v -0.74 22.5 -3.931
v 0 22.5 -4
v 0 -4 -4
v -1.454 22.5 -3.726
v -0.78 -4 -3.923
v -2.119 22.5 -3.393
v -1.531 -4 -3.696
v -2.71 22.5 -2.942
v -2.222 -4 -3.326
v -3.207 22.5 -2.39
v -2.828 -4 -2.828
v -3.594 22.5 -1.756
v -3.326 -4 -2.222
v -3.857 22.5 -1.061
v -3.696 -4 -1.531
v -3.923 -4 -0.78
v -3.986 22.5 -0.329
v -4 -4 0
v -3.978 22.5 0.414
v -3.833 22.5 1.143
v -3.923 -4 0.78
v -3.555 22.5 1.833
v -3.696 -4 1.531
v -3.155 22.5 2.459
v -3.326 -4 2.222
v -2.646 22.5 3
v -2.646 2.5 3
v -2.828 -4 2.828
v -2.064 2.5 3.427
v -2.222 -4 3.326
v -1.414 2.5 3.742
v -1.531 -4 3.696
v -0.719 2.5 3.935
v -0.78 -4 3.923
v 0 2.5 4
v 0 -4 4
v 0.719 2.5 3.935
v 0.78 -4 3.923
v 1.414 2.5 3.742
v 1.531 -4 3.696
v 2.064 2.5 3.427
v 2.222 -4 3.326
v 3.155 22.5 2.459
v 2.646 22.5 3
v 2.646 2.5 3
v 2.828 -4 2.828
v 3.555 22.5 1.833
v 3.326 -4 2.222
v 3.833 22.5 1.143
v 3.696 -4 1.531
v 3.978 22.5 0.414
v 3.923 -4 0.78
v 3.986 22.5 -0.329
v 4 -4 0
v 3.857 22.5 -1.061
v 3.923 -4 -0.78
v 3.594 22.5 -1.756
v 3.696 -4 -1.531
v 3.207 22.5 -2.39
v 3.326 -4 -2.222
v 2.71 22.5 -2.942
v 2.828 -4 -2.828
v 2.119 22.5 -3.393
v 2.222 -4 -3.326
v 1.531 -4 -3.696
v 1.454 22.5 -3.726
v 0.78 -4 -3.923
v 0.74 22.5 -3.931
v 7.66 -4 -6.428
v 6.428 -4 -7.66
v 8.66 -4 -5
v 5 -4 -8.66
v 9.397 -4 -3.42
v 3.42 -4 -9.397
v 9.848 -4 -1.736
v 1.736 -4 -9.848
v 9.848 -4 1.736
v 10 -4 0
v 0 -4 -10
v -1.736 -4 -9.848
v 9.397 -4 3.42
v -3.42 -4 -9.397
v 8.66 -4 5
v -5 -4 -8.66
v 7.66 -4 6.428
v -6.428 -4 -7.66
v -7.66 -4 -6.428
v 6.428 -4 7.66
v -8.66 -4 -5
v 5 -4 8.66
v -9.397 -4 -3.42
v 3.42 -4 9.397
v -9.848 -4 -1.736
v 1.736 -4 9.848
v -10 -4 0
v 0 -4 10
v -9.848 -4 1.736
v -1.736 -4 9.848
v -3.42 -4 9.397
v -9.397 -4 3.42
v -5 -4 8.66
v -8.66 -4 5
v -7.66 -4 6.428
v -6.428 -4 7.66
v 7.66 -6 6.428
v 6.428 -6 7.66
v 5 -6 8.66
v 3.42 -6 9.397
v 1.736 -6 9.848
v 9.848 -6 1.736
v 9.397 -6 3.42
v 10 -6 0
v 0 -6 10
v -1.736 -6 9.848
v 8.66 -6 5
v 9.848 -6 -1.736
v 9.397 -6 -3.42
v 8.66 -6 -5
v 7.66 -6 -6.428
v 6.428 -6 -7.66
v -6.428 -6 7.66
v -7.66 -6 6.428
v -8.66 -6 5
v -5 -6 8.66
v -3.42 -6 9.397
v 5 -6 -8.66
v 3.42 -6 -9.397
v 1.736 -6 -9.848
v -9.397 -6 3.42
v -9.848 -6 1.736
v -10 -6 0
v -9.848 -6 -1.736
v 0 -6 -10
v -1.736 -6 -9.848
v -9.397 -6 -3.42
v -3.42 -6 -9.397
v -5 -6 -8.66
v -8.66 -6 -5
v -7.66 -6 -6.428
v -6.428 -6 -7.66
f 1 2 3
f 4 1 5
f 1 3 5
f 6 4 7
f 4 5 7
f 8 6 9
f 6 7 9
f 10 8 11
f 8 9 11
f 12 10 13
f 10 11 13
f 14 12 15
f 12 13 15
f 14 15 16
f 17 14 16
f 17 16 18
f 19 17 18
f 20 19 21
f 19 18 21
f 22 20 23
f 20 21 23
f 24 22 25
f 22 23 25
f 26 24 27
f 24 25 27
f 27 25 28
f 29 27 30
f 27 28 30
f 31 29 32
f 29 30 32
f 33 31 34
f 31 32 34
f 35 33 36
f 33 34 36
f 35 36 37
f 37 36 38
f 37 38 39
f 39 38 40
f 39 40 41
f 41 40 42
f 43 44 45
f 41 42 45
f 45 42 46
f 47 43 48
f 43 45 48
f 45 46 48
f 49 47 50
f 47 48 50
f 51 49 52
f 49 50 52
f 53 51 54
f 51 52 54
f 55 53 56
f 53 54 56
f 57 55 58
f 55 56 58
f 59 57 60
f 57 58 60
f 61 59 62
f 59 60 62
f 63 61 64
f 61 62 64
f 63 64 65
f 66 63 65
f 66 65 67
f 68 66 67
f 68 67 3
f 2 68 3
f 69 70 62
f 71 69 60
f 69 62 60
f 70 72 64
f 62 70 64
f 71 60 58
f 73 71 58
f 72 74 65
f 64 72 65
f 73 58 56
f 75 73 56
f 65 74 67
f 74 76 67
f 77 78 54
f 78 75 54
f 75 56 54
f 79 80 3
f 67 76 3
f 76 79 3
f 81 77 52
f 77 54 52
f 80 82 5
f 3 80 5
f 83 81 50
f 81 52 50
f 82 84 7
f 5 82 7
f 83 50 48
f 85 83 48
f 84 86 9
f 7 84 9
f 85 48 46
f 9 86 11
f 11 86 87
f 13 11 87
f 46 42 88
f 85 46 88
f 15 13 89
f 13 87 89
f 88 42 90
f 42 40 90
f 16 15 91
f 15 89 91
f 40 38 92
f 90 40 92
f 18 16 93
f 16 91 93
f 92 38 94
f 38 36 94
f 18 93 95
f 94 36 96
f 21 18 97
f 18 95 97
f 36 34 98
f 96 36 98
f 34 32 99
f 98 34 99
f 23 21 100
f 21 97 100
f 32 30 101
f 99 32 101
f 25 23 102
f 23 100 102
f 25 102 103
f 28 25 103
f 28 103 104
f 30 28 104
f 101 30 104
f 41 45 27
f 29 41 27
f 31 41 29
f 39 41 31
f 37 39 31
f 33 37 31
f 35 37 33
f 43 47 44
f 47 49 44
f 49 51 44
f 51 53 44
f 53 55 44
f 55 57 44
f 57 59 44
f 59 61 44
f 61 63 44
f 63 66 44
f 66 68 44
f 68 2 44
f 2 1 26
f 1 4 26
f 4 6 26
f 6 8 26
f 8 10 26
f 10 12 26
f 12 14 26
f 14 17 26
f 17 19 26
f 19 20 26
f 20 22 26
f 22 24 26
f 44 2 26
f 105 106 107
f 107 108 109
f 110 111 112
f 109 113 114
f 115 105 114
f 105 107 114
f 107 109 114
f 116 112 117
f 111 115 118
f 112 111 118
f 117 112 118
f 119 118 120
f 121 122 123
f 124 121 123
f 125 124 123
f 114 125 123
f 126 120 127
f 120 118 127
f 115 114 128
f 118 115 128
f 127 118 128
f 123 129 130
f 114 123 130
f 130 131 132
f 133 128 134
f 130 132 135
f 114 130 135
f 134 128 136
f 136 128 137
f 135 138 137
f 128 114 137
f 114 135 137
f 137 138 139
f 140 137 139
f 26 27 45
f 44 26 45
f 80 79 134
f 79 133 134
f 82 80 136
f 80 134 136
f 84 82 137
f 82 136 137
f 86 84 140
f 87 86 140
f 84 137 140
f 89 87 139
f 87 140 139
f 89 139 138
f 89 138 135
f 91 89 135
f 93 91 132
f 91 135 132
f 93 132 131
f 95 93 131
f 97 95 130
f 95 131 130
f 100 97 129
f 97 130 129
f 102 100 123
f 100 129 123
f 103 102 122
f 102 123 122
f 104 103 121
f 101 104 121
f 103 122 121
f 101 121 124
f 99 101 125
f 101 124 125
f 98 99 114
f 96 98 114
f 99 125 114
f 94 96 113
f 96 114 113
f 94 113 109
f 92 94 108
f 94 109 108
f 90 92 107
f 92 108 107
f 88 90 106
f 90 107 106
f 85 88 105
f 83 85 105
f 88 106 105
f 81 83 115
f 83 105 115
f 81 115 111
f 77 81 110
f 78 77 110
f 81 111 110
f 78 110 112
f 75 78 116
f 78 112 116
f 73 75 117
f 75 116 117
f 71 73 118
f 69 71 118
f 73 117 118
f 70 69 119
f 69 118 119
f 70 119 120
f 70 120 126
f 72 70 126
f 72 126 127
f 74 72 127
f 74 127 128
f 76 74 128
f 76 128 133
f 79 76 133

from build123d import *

# Parameters (mm, degrees)
CUT_EXTRUDE1_START = -20
CUT_EXTRUDE1_DEPTH = 20


with BuildPart() as part:
    # Sketch1 → Revolve1 (revolve)
    with BuildSketch(Plane.XY):
        Polygon((0, 22.5), (4, 22.5), (4, -4), (10, -4), (10, -6), (0, -6), align=None)
    revolve(axis=Axis((0, -6, 0), (0, 1, 0)))

    # Sketch2 → Cut-Extrude1 (cut)
    with BuildSketch(Plane(origin=(0, 22.5, 0), x_dir=(1, 0, 0), z_dir=(0, 1, 0)).offset(CUT_EXTRUDE1_START)):
        with BuildLine():
            Line((-2.645751311, -3), (2.645751311, -3))
            ThreePointArc((2.645751311, -3), (0, -4), (-2.645751311, -3))
        make_face()
    extrude(amount=CUT_EXTRUDE1_DEPTH, mode=Mode.SUBTRACT)


solid = part.part
